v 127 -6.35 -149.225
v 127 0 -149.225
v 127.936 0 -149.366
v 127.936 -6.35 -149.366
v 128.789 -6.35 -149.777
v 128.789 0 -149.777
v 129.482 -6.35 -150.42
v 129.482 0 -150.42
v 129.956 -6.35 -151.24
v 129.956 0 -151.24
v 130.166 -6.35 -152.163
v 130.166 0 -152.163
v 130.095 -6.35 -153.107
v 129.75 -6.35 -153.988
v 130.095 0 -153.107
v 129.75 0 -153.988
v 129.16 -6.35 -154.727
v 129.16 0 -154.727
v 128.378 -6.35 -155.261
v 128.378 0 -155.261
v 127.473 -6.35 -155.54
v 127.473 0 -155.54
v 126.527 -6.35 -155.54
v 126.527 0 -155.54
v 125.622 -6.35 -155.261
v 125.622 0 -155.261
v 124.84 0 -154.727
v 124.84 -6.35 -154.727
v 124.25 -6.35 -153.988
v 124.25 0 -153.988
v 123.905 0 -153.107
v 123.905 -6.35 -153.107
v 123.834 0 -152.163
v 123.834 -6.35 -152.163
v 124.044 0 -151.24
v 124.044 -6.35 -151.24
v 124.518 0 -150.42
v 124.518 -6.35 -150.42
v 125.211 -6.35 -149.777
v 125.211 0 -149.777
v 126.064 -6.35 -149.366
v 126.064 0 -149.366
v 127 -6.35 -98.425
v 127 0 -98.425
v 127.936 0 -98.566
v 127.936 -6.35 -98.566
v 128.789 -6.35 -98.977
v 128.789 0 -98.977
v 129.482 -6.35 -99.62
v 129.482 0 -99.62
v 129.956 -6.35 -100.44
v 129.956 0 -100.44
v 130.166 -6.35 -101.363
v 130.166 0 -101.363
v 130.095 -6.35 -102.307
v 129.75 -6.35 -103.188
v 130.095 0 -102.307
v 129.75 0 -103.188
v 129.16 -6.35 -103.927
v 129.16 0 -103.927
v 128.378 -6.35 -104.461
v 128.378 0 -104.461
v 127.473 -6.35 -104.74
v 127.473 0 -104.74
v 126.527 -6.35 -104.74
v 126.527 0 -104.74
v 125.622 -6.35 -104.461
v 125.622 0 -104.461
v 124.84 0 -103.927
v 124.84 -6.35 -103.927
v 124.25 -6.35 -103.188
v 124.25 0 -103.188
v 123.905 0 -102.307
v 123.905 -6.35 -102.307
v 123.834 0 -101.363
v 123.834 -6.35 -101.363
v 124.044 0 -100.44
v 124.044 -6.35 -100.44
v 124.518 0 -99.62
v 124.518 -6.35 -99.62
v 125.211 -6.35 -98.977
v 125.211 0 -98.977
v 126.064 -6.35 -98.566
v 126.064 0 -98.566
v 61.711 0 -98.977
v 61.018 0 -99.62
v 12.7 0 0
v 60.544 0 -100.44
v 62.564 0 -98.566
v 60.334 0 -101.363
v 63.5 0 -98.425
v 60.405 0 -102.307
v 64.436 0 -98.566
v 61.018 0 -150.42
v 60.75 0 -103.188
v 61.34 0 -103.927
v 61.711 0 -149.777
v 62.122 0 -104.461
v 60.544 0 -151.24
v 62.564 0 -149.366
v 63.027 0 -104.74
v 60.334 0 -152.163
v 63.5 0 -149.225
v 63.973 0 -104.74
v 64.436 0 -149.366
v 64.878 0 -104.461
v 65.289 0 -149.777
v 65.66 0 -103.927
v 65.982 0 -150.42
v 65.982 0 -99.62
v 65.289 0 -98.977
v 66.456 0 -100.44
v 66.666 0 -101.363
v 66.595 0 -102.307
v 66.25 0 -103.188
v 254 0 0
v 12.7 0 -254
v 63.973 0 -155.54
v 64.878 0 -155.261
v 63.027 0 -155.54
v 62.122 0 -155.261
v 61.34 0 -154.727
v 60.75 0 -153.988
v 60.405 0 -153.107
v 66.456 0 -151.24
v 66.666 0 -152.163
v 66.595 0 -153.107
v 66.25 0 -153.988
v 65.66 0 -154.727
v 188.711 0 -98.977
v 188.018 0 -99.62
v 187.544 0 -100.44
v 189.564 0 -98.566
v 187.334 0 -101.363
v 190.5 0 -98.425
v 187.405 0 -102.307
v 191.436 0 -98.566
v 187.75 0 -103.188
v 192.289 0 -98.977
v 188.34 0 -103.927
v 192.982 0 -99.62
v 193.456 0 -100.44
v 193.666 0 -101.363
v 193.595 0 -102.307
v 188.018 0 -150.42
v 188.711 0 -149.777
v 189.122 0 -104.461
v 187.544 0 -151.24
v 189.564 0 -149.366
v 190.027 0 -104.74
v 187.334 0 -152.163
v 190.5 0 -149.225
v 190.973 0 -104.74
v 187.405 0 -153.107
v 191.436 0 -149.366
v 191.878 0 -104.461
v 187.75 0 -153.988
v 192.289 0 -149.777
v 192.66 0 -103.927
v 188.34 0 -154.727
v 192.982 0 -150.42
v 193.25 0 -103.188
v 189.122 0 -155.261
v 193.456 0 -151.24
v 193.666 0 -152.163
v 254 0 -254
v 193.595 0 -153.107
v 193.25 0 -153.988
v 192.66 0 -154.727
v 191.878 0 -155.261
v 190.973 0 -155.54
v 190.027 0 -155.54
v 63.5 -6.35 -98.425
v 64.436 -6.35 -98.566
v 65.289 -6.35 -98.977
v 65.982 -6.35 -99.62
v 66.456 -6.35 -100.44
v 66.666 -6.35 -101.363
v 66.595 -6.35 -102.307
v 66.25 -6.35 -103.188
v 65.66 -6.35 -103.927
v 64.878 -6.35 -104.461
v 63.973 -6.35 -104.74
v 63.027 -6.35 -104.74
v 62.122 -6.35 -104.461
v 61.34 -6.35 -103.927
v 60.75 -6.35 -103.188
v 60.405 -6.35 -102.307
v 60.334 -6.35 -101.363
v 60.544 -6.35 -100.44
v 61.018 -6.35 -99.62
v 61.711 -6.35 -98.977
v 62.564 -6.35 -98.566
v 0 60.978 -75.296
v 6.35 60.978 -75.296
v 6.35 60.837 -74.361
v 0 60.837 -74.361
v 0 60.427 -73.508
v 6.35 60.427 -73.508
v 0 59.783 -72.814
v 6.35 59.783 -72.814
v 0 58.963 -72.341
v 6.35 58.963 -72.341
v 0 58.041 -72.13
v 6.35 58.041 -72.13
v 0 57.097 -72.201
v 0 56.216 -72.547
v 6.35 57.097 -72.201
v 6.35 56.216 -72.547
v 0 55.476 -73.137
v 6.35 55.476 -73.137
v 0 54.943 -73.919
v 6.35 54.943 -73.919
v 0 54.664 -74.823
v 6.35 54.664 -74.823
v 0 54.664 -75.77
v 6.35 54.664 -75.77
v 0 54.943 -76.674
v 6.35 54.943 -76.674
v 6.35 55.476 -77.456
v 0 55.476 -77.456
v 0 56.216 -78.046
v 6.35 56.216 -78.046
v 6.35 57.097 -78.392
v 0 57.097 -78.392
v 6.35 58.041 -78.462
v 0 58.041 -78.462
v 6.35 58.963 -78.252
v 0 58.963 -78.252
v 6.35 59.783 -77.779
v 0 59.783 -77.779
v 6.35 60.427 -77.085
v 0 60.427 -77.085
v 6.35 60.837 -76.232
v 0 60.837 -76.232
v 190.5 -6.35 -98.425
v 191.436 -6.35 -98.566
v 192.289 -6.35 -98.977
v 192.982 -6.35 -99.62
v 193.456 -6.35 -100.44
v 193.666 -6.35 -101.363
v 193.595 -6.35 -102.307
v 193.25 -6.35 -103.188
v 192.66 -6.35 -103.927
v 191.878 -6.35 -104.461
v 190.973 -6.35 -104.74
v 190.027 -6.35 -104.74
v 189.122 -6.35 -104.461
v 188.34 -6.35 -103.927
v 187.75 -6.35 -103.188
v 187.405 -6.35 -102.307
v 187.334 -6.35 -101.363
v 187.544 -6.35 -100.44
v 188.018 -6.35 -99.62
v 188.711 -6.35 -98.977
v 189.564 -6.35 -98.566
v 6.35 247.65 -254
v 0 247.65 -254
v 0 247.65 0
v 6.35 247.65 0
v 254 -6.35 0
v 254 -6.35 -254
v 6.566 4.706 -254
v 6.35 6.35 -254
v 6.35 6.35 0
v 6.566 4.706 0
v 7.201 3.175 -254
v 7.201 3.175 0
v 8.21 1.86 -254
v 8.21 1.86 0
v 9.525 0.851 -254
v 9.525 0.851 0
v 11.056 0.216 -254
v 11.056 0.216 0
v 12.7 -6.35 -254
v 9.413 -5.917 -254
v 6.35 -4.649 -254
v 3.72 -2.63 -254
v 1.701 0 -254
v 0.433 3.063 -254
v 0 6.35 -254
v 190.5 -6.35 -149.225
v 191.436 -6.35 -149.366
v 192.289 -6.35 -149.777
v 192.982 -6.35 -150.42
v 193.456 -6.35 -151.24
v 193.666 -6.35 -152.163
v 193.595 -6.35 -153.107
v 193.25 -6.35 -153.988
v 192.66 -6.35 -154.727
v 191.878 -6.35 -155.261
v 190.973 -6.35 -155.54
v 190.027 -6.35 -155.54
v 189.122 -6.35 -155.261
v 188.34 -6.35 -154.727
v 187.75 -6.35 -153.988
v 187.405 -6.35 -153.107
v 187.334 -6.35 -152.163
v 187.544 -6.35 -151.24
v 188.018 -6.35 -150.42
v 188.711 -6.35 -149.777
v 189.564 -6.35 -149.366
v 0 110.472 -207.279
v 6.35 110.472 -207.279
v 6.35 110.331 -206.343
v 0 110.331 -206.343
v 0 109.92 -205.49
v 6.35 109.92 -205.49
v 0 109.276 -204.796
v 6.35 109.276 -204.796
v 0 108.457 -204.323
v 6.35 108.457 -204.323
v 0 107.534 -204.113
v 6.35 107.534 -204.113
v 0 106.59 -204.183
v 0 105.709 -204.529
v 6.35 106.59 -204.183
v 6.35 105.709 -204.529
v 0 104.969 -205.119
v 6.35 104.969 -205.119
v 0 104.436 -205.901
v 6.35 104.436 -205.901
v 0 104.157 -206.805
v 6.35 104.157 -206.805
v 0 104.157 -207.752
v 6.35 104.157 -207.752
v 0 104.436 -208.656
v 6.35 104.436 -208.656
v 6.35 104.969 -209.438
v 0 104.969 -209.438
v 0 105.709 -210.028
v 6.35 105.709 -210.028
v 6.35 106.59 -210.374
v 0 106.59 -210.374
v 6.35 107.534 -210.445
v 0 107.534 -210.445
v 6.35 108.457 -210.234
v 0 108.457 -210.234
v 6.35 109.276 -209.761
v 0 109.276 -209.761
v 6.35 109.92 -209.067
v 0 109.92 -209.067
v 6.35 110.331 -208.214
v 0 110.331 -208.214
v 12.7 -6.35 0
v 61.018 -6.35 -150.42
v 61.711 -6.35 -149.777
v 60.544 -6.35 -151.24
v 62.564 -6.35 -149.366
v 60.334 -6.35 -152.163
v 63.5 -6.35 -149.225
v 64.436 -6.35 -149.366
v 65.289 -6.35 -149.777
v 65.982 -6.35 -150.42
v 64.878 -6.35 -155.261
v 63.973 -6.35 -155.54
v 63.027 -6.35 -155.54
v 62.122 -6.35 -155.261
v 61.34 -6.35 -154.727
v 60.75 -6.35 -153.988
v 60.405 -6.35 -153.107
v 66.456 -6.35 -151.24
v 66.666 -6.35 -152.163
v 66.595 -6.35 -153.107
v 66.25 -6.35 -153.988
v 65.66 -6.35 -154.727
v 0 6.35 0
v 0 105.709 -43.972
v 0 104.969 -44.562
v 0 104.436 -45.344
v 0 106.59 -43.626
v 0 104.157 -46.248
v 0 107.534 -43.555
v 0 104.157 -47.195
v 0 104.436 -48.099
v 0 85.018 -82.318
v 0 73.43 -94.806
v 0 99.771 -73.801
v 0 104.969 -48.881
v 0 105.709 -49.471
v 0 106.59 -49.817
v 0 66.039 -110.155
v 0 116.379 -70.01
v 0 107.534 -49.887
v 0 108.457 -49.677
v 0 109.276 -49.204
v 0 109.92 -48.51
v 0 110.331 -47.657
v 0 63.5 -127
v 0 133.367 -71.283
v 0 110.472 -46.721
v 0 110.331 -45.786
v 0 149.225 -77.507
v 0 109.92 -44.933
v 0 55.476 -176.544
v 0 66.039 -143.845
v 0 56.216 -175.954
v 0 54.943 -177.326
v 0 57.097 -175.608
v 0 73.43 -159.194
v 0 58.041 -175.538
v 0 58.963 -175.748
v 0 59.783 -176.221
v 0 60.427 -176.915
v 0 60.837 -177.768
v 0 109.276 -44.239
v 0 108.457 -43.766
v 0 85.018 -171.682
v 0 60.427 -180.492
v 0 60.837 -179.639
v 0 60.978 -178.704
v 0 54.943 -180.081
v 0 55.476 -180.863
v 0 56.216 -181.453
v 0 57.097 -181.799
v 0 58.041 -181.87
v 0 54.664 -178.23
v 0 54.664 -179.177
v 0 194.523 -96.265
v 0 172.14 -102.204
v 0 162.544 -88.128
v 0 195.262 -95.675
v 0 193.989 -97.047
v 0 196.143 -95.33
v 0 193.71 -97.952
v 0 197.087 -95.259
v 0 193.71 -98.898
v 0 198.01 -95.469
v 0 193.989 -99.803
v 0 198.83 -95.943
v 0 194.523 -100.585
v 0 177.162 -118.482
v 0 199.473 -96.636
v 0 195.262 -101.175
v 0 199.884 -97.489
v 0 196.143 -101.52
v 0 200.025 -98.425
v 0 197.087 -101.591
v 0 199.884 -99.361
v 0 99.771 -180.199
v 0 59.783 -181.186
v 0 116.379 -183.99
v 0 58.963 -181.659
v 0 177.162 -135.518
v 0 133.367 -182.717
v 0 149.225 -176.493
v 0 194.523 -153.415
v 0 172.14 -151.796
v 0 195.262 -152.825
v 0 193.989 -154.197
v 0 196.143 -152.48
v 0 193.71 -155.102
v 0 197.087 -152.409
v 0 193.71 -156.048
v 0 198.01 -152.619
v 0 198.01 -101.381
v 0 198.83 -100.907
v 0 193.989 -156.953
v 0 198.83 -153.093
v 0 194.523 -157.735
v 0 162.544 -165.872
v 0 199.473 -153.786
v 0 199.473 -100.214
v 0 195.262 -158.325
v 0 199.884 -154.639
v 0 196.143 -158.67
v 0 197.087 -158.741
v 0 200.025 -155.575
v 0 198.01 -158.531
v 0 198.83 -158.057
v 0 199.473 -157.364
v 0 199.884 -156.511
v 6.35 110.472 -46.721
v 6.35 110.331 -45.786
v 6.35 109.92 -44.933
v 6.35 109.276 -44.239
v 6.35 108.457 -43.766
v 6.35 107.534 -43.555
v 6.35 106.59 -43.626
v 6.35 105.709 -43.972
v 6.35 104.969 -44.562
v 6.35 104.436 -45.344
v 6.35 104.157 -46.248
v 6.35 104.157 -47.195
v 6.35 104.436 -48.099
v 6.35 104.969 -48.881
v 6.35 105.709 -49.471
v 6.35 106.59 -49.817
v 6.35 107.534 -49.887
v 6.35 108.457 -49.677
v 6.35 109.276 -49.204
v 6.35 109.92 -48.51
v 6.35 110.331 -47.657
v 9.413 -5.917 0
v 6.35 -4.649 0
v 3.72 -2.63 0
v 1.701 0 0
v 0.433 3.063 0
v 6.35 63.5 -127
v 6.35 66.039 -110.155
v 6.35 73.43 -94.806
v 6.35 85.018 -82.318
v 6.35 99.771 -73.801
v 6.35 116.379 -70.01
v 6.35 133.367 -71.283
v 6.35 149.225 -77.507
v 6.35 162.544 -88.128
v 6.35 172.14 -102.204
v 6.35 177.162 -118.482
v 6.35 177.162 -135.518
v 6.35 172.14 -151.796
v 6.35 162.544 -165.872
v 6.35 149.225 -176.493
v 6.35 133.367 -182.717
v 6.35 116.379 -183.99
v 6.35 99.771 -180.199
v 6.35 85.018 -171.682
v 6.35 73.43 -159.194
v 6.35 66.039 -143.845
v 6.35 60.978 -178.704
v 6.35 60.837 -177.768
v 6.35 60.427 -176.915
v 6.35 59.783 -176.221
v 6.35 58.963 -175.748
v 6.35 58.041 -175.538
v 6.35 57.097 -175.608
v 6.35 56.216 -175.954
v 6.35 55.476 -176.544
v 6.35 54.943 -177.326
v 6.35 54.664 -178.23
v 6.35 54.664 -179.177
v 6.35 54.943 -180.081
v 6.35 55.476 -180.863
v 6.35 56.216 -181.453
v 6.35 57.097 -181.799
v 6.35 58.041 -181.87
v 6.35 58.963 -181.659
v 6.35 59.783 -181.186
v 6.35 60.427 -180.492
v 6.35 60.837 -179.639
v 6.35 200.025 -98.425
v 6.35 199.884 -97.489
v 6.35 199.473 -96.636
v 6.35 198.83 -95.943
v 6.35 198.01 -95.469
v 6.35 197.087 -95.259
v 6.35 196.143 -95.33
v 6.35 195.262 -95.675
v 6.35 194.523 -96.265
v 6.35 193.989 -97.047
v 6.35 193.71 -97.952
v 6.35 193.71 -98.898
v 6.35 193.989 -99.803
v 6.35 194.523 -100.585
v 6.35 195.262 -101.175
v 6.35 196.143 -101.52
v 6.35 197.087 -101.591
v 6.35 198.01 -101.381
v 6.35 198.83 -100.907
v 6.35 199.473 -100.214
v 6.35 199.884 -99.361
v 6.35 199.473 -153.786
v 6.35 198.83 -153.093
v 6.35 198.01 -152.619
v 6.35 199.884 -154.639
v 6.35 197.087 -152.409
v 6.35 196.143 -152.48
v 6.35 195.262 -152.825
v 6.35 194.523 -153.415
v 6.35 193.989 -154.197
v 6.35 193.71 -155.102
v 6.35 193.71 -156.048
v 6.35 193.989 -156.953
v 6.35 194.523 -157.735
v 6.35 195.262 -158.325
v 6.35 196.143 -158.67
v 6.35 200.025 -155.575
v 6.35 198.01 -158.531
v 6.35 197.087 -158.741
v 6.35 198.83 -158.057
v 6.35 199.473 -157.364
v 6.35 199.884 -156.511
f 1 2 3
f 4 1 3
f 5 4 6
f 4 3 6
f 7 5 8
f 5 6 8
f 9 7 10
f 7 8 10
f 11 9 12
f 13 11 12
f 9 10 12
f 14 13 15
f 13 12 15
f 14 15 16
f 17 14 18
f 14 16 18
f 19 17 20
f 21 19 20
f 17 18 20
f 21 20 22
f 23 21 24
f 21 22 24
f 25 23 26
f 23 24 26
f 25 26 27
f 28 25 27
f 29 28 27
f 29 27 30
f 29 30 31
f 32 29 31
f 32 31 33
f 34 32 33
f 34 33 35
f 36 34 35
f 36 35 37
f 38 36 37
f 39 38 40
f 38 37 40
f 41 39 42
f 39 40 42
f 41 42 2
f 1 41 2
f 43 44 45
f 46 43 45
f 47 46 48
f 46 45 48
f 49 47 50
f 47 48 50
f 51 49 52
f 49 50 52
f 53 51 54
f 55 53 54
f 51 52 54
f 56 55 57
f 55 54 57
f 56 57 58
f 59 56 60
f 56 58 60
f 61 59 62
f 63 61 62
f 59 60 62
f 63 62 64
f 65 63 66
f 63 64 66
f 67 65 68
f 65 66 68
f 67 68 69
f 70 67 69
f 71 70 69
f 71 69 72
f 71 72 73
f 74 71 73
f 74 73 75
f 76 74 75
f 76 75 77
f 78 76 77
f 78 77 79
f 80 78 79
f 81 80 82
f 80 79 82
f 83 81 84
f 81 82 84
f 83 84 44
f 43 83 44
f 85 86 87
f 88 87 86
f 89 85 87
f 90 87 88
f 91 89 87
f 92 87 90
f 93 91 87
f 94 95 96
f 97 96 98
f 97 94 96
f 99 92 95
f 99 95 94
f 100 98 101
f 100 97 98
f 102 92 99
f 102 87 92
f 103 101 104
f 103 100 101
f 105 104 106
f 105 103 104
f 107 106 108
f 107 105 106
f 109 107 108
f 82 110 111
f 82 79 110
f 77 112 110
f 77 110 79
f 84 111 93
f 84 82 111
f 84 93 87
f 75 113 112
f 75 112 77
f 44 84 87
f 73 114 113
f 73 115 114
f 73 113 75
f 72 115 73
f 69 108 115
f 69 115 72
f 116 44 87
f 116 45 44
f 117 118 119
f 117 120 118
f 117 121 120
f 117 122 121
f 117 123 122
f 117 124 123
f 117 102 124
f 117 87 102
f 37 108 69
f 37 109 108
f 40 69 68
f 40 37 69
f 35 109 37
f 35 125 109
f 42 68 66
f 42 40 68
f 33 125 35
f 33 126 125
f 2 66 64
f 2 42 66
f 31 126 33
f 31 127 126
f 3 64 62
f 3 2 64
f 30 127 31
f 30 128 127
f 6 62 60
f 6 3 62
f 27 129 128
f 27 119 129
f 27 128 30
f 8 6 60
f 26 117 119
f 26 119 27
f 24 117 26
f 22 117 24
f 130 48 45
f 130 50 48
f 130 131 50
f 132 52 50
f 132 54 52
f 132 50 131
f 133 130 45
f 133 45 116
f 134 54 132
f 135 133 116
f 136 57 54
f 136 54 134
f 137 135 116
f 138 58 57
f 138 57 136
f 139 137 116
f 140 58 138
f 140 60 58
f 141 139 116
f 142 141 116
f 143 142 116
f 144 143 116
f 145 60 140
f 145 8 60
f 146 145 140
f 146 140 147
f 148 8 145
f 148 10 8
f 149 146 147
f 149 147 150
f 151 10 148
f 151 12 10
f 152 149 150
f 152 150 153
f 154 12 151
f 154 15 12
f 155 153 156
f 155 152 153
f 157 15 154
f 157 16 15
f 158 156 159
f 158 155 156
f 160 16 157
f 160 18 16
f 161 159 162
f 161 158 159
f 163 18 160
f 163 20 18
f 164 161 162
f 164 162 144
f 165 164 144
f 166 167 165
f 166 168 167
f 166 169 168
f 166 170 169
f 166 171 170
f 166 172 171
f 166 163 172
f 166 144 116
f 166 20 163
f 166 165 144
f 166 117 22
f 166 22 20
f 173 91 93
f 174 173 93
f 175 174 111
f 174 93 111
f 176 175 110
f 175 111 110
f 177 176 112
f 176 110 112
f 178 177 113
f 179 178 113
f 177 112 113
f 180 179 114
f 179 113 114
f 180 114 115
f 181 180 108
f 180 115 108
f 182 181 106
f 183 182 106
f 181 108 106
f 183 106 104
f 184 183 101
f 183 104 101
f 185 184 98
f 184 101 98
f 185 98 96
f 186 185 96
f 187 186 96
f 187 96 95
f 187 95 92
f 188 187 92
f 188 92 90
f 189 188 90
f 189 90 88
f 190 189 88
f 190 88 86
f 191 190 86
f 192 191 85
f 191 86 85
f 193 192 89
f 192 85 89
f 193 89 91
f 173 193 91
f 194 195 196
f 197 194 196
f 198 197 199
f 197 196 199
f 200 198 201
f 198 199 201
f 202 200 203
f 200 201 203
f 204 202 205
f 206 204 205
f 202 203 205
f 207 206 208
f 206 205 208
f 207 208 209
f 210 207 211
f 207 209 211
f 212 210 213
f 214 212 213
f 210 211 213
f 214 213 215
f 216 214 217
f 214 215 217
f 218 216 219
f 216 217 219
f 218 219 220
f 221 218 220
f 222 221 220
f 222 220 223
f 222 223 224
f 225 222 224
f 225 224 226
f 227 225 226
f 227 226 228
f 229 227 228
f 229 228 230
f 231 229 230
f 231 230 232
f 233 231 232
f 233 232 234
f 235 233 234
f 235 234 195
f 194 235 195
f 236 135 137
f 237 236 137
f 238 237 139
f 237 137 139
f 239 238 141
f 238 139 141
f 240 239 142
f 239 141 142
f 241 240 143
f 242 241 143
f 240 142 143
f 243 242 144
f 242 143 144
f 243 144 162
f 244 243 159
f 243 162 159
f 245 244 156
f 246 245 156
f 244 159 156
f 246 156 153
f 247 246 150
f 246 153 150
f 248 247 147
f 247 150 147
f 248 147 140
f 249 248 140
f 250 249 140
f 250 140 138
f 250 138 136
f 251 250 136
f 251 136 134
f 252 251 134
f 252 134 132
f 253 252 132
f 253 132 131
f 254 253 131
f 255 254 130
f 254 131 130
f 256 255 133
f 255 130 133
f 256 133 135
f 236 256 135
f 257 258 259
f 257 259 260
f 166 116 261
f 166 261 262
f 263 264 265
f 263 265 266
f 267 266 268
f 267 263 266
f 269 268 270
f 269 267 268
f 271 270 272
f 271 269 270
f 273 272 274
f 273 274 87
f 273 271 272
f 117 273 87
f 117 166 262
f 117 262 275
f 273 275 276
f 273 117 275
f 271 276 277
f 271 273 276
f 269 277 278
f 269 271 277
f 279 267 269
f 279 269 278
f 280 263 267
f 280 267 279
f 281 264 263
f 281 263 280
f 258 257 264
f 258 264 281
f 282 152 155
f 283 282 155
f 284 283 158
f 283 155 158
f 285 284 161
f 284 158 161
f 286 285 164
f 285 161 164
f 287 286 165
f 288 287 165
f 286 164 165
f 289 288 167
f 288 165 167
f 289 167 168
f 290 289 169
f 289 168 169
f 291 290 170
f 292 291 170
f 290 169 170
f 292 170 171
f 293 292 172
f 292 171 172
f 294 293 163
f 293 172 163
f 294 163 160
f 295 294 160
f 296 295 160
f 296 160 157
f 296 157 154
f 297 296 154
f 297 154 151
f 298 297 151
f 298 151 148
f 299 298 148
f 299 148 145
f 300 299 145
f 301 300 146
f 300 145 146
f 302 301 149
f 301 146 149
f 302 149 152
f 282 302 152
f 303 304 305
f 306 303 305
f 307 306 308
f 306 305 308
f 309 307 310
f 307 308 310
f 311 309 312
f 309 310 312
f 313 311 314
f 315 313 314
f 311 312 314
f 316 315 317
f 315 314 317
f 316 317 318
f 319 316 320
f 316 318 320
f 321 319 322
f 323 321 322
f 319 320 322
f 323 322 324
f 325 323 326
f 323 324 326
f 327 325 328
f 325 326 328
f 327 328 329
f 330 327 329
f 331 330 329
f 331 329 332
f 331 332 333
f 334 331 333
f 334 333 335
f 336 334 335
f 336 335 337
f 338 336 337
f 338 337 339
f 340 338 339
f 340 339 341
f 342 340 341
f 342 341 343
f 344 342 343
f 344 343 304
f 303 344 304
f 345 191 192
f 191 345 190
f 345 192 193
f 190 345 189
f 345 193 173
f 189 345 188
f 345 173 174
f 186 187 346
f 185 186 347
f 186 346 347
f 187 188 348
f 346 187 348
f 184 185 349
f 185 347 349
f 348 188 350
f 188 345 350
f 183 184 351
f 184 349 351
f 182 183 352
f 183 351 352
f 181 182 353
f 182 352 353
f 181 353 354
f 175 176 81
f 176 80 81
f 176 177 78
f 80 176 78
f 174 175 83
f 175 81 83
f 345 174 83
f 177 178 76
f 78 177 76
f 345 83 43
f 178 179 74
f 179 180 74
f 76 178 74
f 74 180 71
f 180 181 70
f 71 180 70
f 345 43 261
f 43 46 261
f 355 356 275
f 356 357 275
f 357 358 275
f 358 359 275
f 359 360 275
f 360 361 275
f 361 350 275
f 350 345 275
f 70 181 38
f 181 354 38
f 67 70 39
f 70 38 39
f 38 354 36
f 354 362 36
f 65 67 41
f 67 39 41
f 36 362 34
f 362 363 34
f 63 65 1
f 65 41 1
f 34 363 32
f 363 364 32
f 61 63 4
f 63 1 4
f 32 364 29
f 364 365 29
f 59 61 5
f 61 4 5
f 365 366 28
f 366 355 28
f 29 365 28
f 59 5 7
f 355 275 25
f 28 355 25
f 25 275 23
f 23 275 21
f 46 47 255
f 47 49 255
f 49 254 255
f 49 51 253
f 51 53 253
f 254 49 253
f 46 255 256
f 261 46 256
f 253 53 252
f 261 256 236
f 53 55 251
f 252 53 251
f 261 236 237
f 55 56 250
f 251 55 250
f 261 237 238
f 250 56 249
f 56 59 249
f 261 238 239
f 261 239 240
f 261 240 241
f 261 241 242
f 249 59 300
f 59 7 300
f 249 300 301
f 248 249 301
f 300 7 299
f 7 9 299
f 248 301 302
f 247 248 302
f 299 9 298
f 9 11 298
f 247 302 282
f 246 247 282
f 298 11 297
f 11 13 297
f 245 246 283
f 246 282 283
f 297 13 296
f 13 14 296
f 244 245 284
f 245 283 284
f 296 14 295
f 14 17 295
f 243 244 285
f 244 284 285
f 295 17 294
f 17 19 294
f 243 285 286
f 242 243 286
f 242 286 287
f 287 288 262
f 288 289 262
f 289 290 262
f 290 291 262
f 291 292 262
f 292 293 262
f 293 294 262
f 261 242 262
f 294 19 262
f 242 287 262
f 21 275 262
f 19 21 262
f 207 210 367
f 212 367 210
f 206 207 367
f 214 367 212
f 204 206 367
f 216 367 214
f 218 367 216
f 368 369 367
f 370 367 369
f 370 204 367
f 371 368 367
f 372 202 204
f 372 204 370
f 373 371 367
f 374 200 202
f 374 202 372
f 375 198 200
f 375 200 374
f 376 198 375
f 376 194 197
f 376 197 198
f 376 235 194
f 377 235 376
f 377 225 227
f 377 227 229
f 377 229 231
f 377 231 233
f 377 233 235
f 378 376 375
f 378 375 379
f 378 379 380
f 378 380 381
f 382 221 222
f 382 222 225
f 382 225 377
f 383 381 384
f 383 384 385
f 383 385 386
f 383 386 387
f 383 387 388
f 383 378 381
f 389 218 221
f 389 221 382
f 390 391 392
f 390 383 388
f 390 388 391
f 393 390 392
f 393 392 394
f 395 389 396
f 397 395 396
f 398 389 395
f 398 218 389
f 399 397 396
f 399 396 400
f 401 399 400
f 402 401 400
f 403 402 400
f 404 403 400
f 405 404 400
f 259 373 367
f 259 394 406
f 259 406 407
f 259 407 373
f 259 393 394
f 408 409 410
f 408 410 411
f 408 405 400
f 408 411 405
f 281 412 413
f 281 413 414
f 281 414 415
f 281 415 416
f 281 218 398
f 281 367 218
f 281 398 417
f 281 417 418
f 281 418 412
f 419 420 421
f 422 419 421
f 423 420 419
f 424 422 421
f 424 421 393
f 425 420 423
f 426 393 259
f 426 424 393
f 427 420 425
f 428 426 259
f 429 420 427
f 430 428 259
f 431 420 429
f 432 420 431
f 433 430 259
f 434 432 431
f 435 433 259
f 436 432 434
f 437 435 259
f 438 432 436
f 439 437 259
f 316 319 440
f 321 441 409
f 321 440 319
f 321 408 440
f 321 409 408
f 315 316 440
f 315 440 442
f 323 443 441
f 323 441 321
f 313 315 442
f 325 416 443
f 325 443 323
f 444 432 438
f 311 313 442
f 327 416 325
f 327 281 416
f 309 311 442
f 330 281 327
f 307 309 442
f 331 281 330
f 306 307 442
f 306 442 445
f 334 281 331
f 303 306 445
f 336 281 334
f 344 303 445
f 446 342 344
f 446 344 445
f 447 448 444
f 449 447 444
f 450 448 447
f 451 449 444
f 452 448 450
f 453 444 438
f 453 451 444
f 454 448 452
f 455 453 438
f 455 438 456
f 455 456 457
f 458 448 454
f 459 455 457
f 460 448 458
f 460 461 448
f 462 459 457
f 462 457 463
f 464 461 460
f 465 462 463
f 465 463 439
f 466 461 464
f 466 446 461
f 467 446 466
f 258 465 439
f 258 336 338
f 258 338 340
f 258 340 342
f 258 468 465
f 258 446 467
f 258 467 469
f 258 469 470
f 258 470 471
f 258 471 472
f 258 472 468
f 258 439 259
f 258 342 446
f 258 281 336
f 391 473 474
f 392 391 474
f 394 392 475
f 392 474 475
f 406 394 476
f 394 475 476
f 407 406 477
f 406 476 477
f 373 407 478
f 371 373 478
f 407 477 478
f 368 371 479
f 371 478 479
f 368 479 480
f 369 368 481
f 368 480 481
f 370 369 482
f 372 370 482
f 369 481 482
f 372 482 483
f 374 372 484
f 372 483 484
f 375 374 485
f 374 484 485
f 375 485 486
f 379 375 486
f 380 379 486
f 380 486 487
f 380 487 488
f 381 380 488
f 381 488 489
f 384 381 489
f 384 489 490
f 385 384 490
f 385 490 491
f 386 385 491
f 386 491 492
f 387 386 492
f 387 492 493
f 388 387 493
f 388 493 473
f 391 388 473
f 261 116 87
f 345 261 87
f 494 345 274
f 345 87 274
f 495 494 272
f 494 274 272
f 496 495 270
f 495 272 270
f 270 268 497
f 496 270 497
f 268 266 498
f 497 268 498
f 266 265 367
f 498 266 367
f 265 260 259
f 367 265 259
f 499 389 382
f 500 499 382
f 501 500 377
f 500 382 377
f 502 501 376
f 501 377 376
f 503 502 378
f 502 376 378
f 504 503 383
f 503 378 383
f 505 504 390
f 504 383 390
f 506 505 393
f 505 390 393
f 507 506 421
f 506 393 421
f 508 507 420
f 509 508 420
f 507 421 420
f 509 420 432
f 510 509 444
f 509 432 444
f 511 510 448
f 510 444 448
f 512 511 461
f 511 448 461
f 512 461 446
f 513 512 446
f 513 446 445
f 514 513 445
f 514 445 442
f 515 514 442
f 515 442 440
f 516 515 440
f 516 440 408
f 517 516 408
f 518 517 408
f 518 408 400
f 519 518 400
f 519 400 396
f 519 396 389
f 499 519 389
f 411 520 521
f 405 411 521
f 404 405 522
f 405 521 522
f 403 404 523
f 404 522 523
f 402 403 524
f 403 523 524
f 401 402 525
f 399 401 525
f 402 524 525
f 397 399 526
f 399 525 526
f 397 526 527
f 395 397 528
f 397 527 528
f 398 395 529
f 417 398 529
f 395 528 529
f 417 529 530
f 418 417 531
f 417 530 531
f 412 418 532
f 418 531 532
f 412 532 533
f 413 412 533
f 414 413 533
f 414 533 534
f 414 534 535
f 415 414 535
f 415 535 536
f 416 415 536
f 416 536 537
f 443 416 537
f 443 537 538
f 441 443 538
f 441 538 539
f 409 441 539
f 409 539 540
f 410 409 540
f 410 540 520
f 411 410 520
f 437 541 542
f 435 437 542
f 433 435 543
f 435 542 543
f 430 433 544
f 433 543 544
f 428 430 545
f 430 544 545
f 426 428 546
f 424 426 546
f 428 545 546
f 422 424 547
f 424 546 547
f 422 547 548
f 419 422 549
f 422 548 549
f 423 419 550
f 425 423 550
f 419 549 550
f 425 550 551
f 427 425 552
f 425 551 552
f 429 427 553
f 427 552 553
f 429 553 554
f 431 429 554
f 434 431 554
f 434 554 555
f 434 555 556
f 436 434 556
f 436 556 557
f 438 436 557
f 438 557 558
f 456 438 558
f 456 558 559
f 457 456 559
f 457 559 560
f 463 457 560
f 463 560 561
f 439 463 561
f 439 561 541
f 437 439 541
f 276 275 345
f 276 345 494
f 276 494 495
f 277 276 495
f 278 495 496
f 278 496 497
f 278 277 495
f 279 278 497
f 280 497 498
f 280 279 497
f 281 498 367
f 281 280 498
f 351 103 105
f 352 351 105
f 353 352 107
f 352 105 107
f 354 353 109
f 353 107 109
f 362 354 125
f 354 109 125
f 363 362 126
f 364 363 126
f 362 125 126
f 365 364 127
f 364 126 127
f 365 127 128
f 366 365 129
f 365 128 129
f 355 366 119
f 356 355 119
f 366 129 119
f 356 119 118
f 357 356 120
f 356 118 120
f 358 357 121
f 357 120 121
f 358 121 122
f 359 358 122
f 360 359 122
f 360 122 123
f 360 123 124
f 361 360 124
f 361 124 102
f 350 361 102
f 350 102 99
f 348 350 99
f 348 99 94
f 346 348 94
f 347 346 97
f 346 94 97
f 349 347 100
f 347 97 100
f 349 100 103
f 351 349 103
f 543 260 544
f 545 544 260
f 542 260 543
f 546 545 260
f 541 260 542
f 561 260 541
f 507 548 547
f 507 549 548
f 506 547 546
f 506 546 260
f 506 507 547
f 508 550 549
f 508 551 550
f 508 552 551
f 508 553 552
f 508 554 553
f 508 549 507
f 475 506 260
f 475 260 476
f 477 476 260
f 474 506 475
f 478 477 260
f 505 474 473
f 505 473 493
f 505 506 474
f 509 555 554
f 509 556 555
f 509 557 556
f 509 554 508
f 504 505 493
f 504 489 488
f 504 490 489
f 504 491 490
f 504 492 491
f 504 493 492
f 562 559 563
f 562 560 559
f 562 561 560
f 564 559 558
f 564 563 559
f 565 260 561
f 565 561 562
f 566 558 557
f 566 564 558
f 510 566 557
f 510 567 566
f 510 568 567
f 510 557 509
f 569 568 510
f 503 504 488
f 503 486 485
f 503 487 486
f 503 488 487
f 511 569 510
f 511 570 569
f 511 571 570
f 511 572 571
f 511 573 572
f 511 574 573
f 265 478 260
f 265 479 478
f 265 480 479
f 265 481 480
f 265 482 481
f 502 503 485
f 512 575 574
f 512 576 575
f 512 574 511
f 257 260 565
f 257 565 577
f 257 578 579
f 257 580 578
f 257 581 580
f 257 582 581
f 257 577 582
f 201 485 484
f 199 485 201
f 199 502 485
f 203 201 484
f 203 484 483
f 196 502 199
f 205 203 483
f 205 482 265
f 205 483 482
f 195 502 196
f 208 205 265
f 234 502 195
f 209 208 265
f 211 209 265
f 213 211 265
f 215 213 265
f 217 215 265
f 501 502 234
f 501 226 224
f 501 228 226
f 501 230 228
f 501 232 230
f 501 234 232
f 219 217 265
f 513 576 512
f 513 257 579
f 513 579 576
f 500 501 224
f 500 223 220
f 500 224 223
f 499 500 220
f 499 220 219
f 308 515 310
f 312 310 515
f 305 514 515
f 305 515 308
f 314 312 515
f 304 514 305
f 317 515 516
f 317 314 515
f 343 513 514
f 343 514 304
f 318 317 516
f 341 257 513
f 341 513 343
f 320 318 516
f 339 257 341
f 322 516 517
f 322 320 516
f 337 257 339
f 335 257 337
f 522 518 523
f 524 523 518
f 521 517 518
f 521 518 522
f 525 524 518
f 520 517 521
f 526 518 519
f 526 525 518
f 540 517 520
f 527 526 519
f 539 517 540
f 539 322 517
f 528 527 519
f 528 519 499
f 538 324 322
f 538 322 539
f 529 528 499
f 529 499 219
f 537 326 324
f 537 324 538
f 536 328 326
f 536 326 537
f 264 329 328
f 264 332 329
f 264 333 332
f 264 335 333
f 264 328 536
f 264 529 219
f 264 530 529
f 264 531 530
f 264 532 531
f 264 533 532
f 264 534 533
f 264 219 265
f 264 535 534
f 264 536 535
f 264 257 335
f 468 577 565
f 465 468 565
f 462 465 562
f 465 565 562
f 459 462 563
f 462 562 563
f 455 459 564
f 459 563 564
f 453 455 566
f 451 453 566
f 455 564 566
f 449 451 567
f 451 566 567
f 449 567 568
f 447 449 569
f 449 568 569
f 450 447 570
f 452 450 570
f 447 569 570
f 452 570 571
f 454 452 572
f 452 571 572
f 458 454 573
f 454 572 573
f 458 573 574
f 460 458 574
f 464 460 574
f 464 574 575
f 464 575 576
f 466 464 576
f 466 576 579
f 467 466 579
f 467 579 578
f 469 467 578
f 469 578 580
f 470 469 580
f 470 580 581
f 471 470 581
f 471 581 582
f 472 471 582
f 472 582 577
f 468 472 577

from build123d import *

# Parameters (mm, degrees)
SKETCH2_W                    = 254
SKETCH2_H                    = 254
SKETCH2_R                    = 3.175
BASE_FLANGE1_DEPTH           = 6.35
EDGE_FLANGE1_STRIP_W         = 38.1
EDGE_FLANGE1_STRIP_H         = 6.35
EDGE_FLANGE1_STRIP_CUT_DEPTH = 254
EDGE_FLANGE1_DEPTH           = 254
SKETCH10_R                   = 57.15
CUT_EXTRUDE1_DEPTH           = 437.305538012
SKETCH12_R                   = 3.175
CUT_EXTRUDE2_DEPTH           = 433.639624861


# Sheet-metal steps are written as plain solids
with BuildPart() as part:
    # Sketch2 → Base-Flange1 (new body)
    with BuildSketch(Plane(origin=(0, 0, 0), x_dir=(1, 0, 0), z_dir=(0, 1, 0))):
        with Locations((127, 127)):
            Rectangle(SKETCH2_W, SKETCH2_H)
        with Locations(Location((190.5, 152.4, 0), (0, 0, 270))):
            Circle(SKETCH2_R, mode=Mode.SUBTRACT)
        with Locations(Location((127, 152.4, 0), (0, 0, 270))):
            Circle(SKETCH2_R, mode=Mode.SUBTRACT)
        with Locations(Location((63.5, 152.4, 0), (0, 0, 270))):
            Circle(SKETCH2_R, mode=Mode.SUBTRACT)
        with Locations(Location((127, 101.6, 0), (0, 0, 270))):
            Circle(SKETCH2_R, mode=Mode.SUBTRACT)
        with Locations(Location((63.5, 101.6, 0), (0, 0, 270))):
            Circle(SKETCH2_R, mode=Mode.SUBTRACT)
        with Locations(Location((190.5, 101.6, 0), (0, 0, 270))):
            Circle(SKETCH2_R, mode=Mode.SUBTRACT)
    extrude(amount=-BASE_FLANGE1_DEPTH)

    # Edge-Flange1 strip (across the edge) → Edge-Flange1 strip cut (cut)
    with BuildSketch(Plane.XY.offset(-254)):
        with Locations((-6.35, -3.175)):
            Rectangle(EDGE_FLANGE1_STRIP_W, EDGE_FLANGE1_STRIP_H)
    extrude(amount=EDGE_FLANGE1_STRIP_CUT_DEPTH, mode=Mode.SUBTRACT)

    # Edge-Flange1 section (across the edge) → Edge-Flange1 (add)
    with BuildSketch(Plane.XY.offset(-254)):
        with BuildLine():
            Line((0, 6.35), (0, 247.65))
            Line((0, 247.65), (6.35, 247.65))
            Line((6.35, 247.65), (6.35, 6.35))
            ThreePointArc((6.35, 6.35), (8.209871939, 1.859871939), (12.7, 0))
            Line((12.7, 0), (12.7, -6.35))
            ThreePointArc((12.7, -6.35), (3.719743879, -2.630256121), (0, 6.35))
        make_face()
    extrude(amount=EDGE_FLANGE1_DEPTH)

    # Sketch10 → Cut-Extrude1 (cut, through all)
    with BuildSketch(Plane.ZY):
        with Locations(Location((-127, 120.65, 0), (0, 0, 270))):
            Circle(SKETCH10_R)
    extrude(amount=-CUT_EXTRUDE1_DEPTH, mode=Mode.SUBTRACT)

    # Sketch12 → Cut-Extrude2 (cut, through all)
    with BuildSketch(Plane(origin=(6.35, 0, 0), x_dir=(0, 0, -1), z_dir=(1, 0, 0))):
        with Locations(Location((75.296364232, 57.803324087, 0), (0, 0, 90))):
            Circle(SKETCH12_R)
        with Locations(Location((46.721364232, 107.296675913, 0), (0, 0, 90))):
            Circle(SKETCH12_R)
        with Locations(Location((98.425, 196.85, 0), (0, 0, 90))):
            Circle(SKETCH12_R)
        with Locations(Location((155.575, 196.85, 0), (0, 0, 90))):
            Circle(SKETCH12_R)
        with Locations(Location((178.703635768, 57.803324087, 0), (0, 0, 90))):
            Circle(SKETCH12_R)
        with Locations(Location((207.278635768, 107.296675913, 0), (0, 0, 90))):
            Circle(SKETCH12_R)
    extrude(amount=-CUT_EXTRUDE2_DEPTH, mode=Mode.SUBTRACT)


solid = part.part
